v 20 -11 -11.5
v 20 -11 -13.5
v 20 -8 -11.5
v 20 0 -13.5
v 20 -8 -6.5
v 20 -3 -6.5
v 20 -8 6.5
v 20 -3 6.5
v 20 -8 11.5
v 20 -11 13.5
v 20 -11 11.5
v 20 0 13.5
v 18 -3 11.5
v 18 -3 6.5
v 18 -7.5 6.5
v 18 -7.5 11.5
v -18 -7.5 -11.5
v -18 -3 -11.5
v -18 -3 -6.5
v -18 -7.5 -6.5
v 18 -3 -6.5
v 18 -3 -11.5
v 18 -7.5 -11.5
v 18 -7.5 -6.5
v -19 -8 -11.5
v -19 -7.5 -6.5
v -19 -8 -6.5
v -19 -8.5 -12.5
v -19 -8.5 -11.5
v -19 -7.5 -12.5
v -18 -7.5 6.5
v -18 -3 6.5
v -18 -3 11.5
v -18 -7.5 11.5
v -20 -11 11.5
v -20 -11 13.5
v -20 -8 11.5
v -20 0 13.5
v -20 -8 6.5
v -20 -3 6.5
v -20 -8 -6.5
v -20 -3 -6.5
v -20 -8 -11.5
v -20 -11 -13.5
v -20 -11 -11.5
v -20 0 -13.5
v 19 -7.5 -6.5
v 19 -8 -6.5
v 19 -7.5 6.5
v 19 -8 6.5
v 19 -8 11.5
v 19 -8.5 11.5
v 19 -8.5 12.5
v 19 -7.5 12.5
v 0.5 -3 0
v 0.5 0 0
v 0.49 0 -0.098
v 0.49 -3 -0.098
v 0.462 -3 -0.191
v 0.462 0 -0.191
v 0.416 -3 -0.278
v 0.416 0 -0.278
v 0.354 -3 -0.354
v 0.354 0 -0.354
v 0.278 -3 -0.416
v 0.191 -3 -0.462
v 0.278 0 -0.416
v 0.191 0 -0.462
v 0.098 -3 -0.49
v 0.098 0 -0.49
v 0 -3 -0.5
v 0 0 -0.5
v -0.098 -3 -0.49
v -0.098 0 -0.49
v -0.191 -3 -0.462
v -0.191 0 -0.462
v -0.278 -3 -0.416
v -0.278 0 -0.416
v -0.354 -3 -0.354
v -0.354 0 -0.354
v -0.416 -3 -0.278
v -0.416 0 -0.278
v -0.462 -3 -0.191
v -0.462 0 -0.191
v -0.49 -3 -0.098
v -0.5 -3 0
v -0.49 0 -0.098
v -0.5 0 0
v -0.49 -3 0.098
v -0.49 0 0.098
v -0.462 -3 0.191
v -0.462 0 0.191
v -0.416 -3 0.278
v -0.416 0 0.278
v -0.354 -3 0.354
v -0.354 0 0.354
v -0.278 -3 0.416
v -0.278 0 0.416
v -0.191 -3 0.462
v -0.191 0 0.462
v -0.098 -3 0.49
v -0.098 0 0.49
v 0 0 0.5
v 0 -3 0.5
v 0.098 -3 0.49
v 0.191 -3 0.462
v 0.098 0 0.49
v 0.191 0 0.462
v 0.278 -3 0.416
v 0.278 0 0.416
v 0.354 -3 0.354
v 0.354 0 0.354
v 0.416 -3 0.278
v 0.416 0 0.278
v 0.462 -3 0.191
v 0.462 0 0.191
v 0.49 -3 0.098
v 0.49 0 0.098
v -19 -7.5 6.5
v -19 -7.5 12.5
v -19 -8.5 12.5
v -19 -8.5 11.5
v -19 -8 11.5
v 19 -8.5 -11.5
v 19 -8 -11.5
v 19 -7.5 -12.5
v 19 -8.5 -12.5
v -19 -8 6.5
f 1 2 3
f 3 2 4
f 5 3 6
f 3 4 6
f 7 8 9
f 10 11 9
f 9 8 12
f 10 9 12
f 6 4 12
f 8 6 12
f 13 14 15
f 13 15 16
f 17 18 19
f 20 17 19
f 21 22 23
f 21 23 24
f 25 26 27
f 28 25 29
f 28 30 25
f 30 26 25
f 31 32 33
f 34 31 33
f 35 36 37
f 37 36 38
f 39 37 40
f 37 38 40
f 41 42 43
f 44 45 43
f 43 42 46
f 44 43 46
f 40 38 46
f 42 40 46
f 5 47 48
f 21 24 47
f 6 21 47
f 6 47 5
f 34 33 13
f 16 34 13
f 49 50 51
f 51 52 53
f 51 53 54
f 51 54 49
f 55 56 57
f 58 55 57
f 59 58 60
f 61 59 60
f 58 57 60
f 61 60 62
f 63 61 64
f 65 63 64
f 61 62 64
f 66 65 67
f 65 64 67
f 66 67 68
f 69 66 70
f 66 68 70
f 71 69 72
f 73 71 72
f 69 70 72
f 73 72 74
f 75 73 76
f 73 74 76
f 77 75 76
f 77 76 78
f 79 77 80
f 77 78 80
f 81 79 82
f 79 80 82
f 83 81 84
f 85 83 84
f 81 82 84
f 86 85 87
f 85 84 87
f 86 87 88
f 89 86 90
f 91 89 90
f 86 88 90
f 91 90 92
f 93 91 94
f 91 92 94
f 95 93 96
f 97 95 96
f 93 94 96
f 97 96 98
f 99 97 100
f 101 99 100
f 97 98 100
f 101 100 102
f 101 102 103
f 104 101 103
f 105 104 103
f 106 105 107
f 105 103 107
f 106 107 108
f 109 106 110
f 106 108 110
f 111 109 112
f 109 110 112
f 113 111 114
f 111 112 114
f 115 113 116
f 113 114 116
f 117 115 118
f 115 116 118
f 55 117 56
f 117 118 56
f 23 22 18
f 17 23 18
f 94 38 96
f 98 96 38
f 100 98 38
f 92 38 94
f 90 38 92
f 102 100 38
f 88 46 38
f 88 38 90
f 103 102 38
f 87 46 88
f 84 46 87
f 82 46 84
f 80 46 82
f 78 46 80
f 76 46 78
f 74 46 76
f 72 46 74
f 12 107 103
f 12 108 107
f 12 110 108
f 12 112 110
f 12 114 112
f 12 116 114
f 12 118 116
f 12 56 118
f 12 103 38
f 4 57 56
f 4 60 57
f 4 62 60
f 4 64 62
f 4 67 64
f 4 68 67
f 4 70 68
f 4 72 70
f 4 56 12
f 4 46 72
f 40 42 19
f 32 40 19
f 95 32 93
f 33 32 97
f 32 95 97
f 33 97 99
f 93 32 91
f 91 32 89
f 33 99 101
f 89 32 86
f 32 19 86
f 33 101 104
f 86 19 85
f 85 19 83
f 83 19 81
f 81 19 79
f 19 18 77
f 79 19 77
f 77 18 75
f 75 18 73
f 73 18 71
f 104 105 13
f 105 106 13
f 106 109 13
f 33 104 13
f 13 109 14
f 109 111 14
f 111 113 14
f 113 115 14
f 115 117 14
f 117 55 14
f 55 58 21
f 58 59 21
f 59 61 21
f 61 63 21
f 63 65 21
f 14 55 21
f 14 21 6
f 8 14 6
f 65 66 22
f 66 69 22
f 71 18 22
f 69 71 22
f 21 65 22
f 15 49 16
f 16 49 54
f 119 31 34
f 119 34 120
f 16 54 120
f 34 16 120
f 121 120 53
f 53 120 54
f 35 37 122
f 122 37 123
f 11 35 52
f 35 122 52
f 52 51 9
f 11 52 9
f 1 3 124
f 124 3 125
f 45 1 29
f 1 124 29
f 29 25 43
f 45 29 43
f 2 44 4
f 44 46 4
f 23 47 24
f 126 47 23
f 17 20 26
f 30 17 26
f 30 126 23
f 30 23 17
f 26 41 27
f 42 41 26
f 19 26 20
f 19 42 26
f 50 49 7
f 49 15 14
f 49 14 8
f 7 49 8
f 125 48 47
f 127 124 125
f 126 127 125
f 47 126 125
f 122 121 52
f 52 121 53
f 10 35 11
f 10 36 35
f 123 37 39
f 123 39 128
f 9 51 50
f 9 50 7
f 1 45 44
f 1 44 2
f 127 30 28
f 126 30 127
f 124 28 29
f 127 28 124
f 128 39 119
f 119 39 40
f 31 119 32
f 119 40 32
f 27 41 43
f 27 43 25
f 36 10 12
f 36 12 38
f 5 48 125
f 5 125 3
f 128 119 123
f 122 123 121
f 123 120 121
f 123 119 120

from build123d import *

# Parameters (mm, degrees)
SKETCH3_W           = 40
SKETCH3_H           = 40
SKETCH3_R           = 5
SKETCH3_R_2         = 0.5
BOSS_EXTRUDE2_DEPTH = 3
BOSS_EXTRUDE3_DEPTH = 8
SKETCH6_W           = 2
SKETCH6_H           = 5
BOSS_EXTRUDE5_DEPTH = 5
SKETCH7_W           = 40
SKETCH7_H           = 6.5
CUT_EXTRUDE1_DEPTH  = 3
SKETCH8_W           = 40
SKETCH8_H           = 6.5
CUT_EXTRUDE2_DEPTH  = 3
CUT_EXTRUDE3_START  = -1
SKETCH5_W           = 5
SKETCH5_H           = 0.5
CUT_EXTRUDE3_DEPTH  = 6


with BuildPart() as part:
    # Sketch3 → Boss-Extrude2 (new body)
    with BuildSketch(Plane(origin=(0, 0, 0), x_dir=(1, 0, 0), z_dir=(0, 1, 0))):
        Rectangle(SKETCH3_W, SKETCH3_H)
        Circle(SKETCH3_R, mode=Mode.SUBTRACT)
        Circle(SKETCH3_R)
        Circle(SKETCH3_R_2, mode=Mode.SUBTRACT)
    extrude(amount=-BOSS_EXTRUDE2_DEPTH)

    # Sketch4 → Boss-Extrude3 (add)
    with BuildSketch(Plane.XZ.offset(3)):
        Polygon((20, -11.5), (0, -11.5), (-20, -11.5), (-20, -13.5), (20, -13.5), align=None)
        Polygon((-20, 11.5), (0, 11.5), (20, 11.5), (20, 13.5), (-20, 13.5), align=None)
    extrude(amount=BOSS_EXTRUDE3_DEPTH)

    # Sketch6 → Boss-Extrude5 (add)
    with BuildSketch(Plane.XZ.offset(3)):
        with Locations((19, 9)):
            Rectangle(SKETCH6_W, SKETCH6_H)
        with Locations((19, -9)):
            Rectangle(SKETCH6_W, SKETCH6_H)
        with Locations((-19, -9)):
            Rectangle(SKETCH6_W, SKETCH6_H)
        with Locations((-19, 9)):
            Rectangle(SKETCH6_W, SKETCH6_H)
    extrude(amount=BOSS_EXTRUDE5_DEPTH)

    # Sketch7 → Cut-Extrude1 (cut)
    with BuildSketch(Plane(origin=(0, -3, 0), x_dir=(-1, 0, 0), z_dir=(0, -1, 0))):
        with Locations((0, -16.75)):
            Rectangle(SKETCH7_W, SKETCH7_H)
    extrude(amount=-CUT_EXTRUDE1_DEPTH, mode=Mode.SUBTRACT)

    # Sketch8 → Cut-Extrude2 (cut)
    with BuildSketch(Plane.XZ.offset(3)):
        with Locations((0, -16.75)):
            Rectangle(SKETCH8_W, SKETCH8_H)
    extrude(amount=-CUT_EXTRUDE2_DEPTH, mode=Mode.SUBTRACT)

    # Sketch5 → Cut-Extrude3 (cut)
    with BuildSketch(Plane.XY.offset(-11.5).offset(CUT_EXTRUDE3_START)):
        Polygon((19, -7.5), (0, -7.5), (0, -8), (5, -8), (5, -8.5), (19, -8.5), align=None)
        Polygon((0, -8), (0, -7.5), (-19, -7.5), (-19, -8.5), (-5, -8.5), (-5, -8), align=None)
        with Locations((-2.5, -8.25)):
            Rectangle(SKETCH5_W, SKETCH5_H)
        with Locations((2.5, -8.25)):
            Rectangle(SKETCH5_W, SKETCH5_H)
    cut_extrude3 = extrude(amount=CUT_EXTRUDE3_DEPTH, mode=Mode.SUBTRACT)

    # Mirror2: Cut-Extrude3 across plane
    add(cut_extrude3.mirror(Plane.XY), mode=Mode.SUBTRACT)


solid = part.part
